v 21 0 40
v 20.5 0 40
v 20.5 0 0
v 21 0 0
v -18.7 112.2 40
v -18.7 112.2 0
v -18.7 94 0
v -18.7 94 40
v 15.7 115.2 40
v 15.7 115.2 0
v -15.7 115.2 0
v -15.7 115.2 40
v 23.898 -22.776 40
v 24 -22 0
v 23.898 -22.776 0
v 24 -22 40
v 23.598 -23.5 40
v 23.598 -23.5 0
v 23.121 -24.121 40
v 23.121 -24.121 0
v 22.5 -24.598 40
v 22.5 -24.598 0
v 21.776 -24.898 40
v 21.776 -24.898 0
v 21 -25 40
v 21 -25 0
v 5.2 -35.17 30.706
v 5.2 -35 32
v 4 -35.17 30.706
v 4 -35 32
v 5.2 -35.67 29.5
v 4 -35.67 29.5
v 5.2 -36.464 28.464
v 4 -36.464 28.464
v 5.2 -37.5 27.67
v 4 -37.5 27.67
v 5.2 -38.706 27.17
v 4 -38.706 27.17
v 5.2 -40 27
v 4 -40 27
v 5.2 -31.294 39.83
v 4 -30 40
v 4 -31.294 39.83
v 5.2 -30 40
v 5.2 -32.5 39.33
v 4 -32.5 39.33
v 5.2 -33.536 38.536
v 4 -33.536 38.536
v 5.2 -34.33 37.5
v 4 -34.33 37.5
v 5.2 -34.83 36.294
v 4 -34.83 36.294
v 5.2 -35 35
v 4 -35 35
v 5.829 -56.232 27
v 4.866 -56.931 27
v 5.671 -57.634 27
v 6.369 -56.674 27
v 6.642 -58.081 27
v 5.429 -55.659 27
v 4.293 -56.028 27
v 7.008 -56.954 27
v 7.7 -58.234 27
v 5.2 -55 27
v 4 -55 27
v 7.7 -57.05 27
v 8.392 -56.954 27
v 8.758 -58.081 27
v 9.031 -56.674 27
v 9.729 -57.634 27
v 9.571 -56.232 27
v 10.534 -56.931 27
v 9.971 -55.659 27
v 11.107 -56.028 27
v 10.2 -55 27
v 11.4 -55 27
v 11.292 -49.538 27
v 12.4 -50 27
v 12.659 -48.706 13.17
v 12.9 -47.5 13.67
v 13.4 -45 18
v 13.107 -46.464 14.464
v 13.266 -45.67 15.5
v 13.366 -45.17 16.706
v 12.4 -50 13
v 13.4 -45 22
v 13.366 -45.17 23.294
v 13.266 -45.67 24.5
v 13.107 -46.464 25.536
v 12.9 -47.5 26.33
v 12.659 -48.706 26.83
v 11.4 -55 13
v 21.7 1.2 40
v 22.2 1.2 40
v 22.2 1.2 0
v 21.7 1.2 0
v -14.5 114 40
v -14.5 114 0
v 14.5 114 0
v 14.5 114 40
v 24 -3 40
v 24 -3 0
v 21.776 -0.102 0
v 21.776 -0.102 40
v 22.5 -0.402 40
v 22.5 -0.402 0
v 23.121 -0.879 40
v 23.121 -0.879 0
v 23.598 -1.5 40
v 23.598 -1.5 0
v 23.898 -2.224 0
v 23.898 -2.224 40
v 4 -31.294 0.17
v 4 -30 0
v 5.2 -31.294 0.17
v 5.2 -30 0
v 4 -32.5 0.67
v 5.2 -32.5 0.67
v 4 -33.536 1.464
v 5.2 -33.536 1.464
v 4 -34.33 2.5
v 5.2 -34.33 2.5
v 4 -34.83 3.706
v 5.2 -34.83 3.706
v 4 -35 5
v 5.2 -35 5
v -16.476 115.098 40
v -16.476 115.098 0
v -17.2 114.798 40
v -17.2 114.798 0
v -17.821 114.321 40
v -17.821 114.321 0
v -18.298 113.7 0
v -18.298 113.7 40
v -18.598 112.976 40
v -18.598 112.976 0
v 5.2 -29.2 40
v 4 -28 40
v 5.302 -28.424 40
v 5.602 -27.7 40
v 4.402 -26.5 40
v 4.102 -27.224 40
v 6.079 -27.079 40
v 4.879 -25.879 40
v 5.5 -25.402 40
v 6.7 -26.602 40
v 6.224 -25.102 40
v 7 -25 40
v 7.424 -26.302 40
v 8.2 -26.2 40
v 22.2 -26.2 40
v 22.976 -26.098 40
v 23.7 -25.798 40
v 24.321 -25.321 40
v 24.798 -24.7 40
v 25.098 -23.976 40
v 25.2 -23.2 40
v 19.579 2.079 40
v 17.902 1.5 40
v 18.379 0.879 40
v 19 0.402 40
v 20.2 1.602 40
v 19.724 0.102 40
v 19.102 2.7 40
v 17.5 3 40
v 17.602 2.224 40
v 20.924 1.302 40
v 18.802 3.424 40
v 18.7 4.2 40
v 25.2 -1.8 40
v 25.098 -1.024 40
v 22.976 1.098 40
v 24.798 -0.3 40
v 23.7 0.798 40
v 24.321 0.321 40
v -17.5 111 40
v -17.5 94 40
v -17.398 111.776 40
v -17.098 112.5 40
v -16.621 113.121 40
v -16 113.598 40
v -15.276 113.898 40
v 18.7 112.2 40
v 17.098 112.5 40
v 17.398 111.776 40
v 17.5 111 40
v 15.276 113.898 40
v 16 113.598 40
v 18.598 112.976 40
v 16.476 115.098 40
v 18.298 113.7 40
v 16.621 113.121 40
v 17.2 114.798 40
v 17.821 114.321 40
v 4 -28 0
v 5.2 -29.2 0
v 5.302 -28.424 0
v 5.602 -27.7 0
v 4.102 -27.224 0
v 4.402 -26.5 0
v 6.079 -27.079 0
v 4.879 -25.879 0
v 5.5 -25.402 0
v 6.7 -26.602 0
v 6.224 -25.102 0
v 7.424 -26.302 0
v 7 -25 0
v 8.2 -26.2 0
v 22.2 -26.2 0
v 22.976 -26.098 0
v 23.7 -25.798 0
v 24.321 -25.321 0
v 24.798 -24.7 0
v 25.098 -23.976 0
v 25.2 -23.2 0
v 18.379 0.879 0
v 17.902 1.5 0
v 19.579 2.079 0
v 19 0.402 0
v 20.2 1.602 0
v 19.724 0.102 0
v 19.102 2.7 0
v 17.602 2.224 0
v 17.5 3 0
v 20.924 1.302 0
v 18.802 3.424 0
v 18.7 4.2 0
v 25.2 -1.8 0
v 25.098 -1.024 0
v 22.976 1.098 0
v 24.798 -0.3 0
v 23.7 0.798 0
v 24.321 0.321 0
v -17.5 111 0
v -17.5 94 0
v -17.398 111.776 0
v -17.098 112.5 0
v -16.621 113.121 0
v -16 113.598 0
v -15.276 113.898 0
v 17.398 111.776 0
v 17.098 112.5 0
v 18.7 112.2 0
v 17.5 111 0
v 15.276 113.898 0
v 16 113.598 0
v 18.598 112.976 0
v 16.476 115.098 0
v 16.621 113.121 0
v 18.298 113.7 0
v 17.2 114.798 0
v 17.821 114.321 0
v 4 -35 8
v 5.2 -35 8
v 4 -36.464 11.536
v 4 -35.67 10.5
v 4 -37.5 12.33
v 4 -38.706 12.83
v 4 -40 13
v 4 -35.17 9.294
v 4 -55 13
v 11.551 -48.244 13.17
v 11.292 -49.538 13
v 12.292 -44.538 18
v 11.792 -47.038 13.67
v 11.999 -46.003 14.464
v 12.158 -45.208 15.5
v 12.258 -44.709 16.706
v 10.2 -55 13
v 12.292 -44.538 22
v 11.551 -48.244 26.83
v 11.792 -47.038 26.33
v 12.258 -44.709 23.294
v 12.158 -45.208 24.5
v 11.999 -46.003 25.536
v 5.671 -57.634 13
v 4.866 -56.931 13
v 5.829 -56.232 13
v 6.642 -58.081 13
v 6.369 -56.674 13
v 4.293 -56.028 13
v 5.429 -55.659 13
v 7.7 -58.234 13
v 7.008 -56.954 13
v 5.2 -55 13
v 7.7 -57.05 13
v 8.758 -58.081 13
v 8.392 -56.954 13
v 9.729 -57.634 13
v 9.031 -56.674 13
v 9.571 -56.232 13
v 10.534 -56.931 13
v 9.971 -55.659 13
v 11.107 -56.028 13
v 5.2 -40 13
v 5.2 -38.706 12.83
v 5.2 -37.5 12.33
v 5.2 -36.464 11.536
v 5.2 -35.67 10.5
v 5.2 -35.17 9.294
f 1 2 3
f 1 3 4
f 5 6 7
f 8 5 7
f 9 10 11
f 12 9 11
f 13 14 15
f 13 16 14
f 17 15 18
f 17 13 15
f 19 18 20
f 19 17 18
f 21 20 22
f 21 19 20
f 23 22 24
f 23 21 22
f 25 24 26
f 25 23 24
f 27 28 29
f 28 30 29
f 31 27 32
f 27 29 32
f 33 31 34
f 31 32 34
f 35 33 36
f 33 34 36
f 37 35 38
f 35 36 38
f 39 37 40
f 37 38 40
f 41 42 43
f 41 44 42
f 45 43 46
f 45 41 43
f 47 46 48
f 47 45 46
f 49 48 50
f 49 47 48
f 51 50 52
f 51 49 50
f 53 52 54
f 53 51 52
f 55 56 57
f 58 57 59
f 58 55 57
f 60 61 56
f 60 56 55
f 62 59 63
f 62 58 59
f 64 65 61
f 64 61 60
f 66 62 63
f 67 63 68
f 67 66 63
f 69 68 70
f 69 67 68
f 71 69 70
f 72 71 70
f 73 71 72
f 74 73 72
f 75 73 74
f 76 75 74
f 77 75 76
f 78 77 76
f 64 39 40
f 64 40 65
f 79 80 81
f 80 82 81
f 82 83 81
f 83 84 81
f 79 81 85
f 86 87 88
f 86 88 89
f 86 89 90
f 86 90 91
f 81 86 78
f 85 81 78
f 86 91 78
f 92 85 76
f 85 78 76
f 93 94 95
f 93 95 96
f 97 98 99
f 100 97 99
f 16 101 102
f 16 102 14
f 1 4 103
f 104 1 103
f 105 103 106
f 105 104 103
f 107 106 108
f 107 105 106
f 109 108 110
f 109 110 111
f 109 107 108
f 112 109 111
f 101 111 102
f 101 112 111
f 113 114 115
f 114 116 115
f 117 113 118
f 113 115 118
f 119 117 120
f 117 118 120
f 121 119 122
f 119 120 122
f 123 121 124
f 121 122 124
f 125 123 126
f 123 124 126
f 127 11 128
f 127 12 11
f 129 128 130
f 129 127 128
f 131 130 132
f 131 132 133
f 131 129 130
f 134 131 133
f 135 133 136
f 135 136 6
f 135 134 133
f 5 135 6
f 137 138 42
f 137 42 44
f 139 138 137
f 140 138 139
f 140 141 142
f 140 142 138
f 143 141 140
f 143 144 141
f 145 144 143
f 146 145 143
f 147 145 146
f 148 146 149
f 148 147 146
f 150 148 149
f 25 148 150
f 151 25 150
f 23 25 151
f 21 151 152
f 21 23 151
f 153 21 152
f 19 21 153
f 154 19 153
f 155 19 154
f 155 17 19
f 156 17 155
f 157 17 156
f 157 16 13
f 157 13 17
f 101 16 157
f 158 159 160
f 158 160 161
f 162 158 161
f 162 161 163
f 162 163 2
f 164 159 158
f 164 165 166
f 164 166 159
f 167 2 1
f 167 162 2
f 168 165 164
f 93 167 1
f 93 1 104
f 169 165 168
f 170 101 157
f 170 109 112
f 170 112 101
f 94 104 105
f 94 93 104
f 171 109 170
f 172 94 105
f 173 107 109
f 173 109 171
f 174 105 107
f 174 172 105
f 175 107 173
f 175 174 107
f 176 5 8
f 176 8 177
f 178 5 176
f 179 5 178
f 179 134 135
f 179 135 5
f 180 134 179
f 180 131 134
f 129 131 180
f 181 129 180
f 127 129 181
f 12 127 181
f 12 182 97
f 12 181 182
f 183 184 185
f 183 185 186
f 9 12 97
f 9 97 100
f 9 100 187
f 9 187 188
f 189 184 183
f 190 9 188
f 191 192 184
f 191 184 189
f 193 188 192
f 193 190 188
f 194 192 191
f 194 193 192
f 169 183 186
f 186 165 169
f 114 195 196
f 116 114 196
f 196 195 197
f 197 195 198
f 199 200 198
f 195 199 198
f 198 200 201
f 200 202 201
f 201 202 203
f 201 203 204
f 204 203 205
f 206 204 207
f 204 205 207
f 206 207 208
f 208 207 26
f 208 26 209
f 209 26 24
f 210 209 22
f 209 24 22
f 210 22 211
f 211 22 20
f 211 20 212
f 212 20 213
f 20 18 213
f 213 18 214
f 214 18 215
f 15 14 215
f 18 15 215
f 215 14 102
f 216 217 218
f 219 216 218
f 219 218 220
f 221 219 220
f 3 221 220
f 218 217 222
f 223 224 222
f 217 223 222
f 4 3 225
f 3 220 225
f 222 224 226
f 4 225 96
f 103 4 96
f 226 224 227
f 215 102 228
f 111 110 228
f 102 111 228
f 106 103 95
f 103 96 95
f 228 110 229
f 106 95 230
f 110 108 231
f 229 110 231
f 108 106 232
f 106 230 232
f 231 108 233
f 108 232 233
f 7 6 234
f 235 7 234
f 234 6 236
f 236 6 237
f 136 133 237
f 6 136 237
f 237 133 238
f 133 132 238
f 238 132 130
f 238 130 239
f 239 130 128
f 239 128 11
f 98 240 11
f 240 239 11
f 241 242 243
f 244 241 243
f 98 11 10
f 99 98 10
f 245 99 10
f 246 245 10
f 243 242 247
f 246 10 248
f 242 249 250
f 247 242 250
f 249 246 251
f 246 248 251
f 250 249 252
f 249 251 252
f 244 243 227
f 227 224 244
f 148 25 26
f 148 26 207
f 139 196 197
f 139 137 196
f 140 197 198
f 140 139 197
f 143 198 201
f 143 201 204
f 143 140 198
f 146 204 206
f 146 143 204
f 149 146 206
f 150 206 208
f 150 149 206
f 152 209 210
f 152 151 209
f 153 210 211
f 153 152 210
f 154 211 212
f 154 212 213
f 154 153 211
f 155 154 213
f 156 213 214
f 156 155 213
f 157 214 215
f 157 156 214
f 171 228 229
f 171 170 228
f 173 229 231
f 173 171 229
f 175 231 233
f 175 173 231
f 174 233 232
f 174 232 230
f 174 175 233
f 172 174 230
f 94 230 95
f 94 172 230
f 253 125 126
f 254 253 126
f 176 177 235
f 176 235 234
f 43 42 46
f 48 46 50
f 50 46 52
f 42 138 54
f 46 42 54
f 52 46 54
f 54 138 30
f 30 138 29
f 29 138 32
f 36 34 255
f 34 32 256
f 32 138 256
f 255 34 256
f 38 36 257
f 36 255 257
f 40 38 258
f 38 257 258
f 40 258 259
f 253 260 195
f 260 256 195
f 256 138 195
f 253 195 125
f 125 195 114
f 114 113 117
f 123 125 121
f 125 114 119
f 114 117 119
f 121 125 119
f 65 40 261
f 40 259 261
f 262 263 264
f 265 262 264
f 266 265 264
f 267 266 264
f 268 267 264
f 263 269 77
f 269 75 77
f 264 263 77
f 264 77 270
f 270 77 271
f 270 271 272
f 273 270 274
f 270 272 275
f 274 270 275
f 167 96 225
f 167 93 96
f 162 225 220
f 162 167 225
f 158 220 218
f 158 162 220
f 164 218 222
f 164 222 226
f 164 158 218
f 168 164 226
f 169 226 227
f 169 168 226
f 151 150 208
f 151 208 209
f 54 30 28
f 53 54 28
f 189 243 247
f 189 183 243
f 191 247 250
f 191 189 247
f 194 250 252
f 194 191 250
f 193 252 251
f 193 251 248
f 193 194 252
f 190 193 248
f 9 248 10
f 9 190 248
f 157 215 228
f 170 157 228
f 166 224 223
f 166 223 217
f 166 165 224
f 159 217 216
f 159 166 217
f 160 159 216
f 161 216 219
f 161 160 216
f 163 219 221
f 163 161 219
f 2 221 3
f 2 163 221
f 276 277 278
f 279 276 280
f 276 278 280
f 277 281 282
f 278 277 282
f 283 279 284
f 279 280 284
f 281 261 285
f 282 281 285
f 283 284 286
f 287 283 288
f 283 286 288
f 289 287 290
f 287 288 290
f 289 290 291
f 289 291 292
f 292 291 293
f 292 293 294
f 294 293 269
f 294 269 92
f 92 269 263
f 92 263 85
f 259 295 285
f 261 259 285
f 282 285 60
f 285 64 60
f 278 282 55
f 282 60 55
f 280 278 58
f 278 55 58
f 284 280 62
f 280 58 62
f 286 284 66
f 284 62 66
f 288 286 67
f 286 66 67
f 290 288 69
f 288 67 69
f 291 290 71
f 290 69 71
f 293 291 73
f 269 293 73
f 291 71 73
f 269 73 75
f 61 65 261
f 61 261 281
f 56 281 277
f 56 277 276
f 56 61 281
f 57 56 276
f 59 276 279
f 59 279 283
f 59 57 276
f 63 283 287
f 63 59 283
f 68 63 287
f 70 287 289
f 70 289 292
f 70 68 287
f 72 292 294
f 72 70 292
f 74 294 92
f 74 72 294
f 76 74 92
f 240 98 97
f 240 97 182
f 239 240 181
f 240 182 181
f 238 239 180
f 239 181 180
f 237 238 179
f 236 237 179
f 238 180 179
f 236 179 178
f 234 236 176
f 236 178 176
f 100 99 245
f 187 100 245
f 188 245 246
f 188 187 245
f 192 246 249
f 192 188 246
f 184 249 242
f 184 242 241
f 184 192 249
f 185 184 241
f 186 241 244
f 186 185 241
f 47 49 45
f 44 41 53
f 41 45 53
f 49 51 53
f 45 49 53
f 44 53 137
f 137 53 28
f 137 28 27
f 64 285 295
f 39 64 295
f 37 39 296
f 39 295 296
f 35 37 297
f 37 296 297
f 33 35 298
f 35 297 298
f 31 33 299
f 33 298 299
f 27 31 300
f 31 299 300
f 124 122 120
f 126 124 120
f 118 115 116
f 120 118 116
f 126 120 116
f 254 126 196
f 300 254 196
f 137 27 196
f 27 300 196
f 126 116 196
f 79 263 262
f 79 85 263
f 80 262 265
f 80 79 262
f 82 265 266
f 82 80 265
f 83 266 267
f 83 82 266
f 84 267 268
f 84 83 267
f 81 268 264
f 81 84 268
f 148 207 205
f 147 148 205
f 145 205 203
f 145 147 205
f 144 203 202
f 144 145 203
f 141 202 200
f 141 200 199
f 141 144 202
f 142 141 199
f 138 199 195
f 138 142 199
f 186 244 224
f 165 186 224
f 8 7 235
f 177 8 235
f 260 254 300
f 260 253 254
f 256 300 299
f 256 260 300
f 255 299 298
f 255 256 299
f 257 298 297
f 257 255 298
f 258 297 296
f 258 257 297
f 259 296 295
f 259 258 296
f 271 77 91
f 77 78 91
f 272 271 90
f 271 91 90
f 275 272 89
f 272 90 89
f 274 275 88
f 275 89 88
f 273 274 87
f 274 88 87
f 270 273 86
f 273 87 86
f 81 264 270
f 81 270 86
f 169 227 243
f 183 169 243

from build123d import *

# Parameters (mm, degrees)
PAD_DEPTH    = 40
PAD001_DEPTH = 7
FILLET_R     = 3
FILLET001_R  = 5


with BuildPart() as part:
    # Sketch → Pad (new body)
    with BuildSketch(Plane.XY):
        Polygon((-17.5, 114), (17.5, 114), (17.5, 0), (24, 0), (24, -25), (4, -25), (4, -35), (5.2, -35), (5.2, -26.2), (25.2, -26.2), (25.2, 1.2), (18.7, 1.2), (18.7, 115.2), (-18.7, 115.2), (-18.7, 94), (-17.5, 94), align=None)
    extrude(amount=PAD_DEPTH)

    # Sketch001 → Pad001 (join, symmetric)
    with BuildSketch(Plane.XY.offset(20)):
        with BuildLine():
            Line((4, -35), (4, -55))
            ThreePointArc((4, -55), (7.7, -58.233631), (11.4, -55))
            Line((13.4, -45), (11.4, -55))
            Line((12.292308, -44.538462), (13.4, -45))
            Line((10.2, -55), (12.292308, -44.538462))
            ThreePointArc((5.2, -55), (7.7, -57.04951), (10.2, -55))
            Line((5.2, -55), (5.2, -35))
            Line((5.2, -35), (4, -35))
        make_face()
    extrude(amount=PAD001_DEPTH, both=True)

    # Fillet
    fillet_edges = [part.edges().sort_by_distance(p)[0] for p in [
        (24, -25, 20),
        (4, -25, 20),
        (17.5, 0, 20),
        (17.5, 114, 20),
        (-17.5, 114, 20),
        (24, 0, 20),
        (25.2, -26.2, 20),
        (25.2, 1.2, 20),
        (18.7, 115.2, 20),
        (5.2, -26.2, 20),
        (-18.7, 115.2, 20),
        (18.7, 1.2, 20),
    ]]
    fillet(fillet_edges, radius=FILLET_R)

    # Fillet001
    fillet001_edges = [part.edges().sort_by_distance(p)[0] for p in [
        (4.6, -35, 0),
        (4.6, -35, 13),
        (4.6, -35, 27),
        (4.6, -35, 40),
        (12.846154, -44.769231, 27),
        (12.846154, -44.769231, 13),
    ]]
    fillet(fillet001_edges, radius=FILLET001_R)


solid = part.part
